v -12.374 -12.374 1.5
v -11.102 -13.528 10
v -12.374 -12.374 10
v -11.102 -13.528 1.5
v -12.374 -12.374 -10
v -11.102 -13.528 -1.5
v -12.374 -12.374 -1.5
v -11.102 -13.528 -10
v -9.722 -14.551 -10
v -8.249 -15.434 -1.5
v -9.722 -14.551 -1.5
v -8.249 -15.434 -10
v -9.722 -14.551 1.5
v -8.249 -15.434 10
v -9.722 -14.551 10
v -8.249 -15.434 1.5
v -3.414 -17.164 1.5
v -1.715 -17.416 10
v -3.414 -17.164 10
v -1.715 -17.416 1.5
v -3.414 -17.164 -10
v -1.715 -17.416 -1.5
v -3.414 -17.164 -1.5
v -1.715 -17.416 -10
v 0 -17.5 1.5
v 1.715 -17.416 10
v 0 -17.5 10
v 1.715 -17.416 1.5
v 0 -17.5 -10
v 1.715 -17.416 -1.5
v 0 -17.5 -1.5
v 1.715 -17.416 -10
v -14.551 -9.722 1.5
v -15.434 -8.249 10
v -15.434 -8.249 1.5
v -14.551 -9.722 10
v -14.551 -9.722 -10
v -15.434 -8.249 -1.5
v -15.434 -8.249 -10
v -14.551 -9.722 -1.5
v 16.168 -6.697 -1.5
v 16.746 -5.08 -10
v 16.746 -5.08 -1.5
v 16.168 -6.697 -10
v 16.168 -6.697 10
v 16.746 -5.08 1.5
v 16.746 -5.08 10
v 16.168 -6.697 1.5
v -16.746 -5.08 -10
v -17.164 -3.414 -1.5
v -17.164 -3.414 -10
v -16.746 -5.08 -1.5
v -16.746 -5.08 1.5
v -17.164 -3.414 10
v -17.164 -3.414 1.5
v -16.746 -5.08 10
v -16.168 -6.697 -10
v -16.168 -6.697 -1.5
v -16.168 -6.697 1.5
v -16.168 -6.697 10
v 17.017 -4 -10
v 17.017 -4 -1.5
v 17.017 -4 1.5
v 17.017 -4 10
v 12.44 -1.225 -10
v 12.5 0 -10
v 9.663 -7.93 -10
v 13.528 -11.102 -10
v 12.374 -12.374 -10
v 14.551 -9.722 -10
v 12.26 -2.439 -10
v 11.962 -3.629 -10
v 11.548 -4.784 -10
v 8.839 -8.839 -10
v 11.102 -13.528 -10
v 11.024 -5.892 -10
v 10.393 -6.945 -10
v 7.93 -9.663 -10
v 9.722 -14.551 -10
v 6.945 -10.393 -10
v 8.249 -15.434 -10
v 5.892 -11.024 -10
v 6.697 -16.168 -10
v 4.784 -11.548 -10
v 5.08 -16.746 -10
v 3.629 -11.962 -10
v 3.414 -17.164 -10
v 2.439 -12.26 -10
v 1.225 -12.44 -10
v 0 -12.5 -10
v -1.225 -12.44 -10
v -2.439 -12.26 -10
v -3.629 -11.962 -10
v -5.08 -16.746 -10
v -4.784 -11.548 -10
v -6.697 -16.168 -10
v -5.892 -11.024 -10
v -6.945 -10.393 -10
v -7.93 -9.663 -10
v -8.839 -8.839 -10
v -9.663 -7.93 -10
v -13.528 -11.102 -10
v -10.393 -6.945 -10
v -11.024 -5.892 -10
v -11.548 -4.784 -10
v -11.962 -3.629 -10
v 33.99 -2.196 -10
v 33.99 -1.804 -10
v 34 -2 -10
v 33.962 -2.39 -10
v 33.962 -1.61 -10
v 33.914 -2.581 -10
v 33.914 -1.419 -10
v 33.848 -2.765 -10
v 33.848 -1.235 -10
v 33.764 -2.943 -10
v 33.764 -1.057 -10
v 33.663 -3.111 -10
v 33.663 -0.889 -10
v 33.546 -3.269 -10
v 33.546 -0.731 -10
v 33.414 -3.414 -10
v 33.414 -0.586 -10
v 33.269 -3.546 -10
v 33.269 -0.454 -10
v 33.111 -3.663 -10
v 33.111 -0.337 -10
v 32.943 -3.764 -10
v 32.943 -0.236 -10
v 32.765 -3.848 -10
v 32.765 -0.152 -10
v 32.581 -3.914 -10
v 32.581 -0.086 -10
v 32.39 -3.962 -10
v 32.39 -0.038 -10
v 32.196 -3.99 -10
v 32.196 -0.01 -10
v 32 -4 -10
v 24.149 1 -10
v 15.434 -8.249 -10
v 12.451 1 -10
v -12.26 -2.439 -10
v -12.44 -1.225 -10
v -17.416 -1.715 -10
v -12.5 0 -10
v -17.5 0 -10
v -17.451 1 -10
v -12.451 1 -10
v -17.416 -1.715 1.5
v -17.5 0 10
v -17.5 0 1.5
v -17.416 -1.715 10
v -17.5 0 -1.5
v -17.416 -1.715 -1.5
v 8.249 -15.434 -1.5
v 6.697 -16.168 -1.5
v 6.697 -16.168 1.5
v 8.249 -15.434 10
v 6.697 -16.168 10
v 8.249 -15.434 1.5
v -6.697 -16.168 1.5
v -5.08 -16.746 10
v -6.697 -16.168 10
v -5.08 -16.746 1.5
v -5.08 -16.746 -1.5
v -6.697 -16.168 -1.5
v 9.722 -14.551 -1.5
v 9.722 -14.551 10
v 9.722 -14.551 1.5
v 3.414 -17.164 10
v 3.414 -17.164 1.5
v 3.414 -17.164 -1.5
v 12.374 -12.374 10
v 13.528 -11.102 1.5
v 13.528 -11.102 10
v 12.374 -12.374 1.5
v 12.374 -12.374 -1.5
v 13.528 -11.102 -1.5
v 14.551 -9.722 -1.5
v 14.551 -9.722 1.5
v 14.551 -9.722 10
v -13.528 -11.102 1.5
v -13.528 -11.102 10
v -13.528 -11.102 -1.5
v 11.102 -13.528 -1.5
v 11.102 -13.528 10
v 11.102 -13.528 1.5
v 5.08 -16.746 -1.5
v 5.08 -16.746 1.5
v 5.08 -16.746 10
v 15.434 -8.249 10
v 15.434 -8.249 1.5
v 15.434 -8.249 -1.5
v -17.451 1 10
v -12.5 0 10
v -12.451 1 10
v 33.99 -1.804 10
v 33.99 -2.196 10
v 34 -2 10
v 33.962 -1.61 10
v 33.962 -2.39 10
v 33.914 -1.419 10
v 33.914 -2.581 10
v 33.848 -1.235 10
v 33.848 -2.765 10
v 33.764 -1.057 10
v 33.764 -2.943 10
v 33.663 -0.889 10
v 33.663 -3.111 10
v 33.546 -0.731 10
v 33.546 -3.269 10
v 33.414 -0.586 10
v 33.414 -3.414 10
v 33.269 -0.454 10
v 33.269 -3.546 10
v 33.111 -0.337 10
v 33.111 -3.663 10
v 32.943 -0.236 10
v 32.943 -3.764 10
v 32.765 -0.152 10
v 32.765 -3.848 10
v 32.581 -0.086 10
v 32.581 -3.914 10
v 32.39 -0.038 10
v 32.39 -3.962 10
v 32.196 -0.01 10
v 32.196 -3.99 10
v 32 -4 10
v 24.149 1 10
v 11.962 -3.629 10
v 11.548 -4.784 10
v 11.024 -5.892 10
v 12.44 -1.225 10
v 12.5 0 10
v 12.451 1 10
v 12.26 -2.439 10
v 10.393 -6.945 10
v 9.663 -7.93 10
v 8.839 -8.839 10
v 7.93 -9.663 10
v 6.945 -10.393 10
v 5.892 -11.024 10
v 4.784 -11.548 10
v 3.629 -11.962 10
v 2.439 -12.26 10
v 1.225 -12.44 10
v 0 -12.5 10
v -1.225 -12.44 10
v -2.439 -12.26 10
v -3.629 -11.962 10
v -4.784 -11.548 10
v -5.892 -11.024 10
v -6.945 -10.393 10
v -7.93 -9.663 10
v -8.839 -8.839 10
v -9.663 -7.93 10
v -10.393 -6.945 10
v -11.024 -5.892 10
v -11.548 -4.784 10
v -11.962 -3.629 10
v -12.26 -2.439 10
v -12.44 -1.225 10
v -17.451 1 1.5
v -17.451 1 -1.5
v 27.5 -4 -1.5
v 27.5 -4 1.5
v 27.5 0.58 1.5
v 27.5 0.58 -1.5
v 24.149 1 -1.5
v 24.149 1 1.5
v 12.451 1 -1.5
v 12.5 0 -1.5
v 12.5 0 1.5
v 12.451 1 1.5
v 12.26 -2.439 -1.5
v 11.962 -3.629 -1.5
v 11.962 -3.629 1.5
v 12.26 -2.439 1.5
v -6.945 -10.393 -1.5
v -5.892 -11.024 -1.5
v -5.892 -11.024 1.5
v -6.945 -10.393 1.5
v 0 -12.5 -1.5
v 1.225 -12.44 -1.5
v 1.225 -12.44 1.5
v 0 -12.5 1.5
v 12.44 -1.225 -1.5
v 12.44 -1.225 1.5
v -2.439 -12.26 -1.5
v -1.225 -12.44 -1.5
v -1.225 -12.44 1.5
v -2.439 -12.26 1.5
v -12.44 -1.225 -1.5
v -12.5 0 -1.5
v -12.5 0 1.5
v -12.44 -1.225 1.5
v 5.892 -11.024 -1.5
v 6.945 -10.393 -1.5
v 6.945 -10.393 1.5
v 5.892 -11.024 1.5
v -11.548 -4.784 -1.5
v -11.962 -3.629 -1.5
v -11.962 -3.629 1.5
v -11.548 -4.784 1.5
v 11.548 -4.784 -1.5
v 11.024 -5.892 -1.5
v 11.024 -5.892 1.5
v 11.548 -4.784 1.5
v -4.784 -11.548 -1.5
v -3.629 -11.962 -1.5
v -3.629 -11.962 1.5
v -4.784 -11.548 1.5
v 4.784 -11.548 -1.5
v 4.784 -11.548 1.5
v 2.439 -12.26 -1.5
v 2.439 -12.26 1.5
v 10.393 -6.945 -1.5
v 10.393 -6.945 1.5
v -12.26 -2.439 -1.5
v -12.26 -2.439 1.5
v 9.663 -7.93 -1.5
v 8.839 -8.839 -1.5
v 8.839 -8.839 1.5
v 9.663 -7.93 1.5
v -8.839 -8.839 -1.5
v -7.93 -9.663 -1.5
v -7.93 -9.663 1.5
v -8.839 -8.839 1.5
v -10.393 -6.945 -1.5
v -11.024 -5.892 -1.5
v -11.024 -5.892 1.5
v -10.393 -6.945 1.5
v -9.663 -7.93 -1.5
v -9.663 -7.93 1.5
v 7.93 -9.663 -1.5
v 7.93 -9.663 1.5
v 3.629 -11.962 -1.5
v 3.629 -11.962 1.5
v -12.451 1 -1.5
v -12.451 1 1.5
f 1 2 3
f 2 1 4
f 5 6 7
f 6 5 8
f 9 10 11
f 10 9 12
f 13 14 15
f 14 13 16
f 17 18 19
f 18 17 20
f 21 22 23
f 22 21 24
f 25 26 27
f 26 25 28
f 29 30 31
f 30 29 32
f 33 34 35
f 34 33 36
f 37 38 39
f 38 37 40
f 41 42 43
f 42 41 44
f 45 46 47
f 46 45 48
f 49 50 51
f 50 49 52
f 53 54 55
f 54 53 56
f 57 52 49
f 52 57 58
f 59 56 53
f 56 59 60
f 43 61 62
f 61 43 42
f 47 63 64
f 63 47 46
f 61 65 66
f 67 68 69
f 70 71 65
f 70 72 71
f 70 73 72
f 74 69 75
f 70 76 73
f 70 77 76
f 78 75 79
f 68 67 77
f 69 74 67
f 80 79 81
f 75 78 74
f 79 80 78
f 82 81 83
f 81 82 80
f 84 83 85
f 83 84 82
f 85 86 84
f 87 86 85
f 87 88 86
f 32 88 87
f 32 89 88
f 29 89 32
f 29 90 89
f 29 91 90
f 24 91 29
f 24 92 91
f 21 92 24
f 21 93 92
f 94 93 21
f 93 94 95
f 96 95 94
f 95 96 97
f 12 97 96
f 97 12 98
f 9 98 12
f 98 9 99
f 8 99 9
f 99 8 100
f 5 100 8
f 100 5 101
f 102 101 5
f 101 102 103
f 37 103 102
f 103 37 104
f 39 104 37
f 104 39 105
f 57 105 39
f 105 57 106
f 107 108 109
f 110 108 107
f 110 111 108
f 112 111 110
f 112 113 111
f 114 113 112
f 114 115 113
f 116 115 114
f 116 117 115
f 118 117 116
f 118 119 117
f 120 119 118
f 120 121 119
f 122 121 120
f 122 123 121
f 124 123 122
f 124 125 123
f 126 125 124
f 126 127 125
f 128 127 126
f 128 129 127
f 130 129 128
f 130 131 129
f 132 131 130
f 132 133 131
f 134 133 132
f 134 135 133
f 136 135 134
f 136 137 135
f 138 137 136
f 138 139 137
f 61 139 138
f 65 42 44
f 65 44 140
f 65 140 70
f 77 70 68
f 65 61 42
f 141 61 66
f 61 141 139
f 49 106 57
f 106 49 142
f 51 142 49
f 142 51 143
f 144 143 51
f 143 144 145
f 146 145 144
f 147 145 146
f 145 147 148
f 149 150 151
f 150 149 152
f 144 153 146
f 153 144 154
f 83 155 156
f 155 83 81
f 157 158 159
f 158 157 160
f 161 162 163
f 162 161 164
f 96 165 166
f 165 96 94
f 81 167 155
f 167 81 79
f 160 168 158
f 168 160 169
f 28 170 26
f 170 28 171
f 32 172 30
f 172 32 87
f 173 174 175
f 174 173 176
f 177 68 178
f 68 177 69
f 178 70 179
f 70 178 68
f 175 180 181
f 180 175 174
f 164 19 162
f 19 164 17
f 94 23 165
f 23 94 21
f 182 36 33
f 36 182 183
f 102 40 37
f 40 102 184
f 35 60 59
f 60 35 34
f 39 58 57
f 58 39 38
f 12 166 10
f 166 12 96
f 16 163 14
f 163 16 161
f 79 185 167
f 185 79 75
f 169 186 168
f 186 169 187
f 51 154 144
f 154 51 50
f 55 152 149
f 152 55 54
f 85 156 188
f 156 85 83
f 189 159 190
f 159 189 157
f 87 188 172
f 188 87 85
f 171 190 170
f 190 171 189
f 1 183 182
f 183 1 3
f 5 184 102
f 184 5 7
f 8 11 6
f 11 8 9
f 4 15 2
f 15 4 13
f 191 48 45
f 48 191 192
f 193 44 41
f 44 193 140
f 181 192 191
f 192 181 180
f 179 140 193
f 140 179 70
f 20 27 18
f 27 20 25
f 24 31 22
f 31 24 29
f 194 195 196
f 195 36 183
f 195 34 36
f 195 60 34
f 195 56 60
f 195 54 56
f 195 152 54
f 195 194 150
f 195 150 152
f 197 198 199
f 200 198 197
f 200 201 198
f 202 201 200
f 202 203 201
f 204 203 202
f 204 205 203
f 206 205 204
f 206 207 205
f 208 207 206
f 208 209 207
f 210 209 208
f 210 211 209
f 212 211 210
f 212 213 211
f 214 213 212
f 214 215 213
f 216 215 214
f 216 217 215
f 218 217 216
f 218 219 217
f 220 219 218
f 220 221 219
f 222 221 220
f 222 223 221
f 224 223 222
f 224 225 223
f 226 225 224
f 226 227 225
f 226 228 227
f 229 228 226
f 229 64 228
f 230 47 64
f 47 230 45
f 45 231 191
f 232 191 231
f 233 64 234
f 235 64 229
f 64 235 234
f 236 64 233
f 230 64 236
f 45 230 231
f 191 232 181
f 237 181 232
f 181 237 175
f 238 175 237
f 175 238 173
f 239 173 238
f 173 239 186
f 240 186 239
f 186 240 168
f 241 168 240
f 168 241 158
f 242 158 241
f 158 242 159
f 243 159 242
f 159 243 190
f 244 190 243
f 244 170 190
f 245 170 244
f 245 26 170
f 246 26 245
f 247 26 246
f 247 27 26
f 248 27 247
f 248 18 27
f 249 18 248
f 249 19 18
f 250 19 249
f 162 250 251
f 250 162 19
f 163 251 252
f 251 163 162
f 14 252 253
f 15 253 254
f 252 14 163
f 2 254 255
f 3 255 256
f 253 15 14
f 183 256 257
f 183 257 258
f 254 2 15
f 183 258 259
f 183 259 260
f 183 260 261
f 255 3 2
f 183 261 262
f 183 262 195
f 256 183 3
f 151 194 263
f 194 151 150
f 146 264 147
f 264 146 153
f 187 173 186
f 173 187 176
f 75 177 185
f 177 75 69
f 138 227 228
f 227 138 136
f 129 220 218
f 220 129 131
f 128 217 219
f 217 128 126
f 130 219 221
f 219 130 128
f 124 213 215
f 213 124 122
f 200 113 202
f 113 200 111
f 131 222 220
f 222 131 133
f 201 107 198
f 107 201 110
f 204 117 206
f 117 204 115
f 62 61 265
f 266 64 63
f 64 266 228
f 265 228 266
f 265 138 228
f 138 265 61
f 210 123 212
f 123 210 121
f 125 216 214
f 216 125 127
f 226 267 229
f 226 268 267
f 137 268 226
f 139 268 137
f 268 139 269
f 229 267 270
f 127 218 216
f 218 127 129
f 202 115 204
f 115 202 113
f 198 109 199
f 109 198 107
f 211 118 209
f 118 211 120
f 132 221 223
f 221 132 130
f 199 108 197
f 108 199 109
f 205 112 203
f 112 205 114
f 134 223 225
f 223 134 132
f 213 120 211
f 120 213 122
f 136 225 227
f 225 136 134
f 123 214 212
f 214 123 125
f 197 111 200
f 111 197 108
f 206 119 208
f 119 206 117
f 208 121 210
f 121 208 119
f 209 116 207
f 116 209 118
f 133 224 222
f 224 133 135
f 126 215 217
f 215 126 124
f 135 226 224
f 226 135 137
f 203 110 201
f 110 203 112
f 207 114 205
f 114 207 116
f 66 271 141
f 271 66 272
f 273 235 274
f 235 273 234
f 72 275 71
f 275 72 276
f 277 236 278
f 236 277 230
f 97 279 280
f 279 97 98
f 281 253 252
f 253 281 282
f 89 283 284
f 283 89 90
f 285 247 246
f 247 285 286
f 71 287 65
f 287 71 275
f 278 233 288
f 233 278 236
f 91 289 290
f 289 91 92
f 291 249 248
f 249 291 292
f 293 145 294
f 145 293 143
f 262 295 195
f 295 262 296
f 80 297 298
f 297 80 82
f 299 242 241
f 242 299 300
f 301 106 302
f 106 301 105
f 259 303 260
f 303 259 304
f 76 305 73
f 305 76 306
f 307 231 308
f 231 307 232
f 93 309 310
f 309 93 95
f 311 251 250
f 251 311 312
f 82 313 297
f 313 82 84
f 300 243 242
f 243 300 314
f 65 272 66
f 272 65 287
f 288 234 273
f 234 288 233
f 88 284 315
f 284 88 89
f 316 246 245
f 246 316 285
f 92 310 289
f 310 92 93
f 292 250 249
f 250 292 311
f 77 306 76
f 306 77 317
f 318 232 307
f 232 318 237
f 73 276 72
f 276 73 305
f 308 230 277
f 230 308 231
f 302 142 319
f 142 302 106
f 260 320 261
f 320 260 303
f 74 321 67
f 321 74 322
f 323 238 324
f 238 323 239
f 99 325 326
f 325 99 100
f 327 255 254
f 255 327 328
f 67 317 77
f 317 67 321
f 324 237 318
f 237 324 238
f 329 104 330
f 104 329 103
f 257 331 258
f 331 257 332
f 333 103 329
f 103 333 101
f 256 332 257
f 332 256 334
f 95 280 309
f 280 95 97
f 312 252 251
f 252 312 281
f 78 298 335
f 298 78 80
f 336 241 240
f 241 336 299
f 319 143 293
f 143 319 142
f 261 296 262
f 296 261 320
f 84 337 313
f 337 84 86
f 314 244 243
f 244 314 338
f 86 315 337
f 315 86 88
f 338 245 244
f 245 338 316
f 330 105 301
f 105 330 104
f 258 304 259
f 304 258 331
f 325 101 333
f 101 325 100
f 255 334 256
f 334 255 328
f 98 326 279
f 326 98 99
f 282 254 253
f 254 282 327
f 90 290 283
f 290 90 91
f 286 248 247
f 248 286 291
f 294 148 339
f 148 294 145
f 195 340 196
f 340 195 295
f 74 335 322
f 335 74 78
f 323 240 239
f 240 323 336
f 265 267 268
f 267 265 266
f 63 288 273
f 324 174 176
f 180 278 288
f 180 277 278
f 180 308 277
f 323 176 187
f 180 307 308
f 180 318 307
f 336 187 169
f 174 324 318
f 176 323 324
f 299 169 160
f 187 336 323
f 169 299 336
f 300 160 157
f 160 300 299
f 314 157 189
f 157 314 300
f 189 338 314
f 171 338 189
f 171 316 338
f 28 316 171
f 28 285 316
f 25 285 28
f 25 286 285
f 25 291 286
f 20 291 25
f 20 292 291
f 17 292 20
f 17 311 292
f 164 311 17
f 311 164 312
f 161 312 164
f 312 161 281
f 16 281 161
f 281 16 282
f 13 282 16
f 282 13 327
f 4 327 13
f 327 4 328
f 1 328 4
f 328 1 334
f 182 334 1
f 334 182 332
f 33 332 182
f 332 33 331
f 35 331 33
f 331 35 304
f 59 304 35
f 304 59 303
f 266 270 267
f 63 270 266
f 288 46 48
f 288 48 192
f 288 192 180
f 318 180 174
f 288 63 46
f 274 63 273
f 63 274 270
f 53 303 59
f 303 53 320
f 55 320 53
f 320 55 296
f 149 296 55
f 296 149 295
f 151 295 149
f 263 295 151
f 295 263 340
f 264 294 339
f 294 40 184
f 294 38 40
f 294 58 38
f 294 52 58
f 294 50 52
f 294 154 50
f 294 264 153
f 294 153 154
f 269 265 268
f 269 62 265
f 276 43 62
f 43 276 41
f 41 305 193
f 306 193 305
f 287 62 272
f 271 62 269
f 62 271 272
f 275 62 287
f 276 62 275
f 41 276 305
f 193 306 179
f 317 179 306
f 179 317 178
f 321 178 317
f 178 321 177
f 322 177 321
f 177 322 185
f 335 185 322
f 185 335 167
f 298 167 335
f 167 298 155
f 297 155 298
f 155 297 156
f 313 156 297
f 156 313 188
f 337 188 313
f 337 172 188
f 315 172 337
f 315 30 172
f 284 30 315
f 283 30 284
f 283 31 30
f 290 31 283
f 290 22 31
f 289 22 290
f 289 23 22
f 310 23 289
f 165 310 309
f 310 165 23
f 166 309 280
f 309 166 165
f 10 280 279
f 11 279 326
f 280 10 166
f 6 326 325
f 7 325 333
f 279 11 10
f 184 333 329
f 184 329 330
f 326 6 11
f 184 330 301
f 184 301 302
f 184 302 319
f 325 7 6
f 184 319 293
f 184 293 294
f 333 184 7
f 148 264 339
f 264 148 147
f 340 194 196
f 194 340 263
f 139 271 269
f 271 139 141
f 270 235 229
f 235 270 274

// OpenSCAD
$fn=64;
difference(){
    union(){
        
        cylinder(d=35, h=20, center=true);
        hull()
        {
            cylinder(d=8, h=20, center=true);
            translate([32,-2,0])
                cylinder(d=4, h=20, center=true);
        }
    }
    cylinder(d=25, h=21, center=true);
    cube([55,55,3], center=true);
    translate([0,17,0])
        cube([80,32,21], center=true);
}
